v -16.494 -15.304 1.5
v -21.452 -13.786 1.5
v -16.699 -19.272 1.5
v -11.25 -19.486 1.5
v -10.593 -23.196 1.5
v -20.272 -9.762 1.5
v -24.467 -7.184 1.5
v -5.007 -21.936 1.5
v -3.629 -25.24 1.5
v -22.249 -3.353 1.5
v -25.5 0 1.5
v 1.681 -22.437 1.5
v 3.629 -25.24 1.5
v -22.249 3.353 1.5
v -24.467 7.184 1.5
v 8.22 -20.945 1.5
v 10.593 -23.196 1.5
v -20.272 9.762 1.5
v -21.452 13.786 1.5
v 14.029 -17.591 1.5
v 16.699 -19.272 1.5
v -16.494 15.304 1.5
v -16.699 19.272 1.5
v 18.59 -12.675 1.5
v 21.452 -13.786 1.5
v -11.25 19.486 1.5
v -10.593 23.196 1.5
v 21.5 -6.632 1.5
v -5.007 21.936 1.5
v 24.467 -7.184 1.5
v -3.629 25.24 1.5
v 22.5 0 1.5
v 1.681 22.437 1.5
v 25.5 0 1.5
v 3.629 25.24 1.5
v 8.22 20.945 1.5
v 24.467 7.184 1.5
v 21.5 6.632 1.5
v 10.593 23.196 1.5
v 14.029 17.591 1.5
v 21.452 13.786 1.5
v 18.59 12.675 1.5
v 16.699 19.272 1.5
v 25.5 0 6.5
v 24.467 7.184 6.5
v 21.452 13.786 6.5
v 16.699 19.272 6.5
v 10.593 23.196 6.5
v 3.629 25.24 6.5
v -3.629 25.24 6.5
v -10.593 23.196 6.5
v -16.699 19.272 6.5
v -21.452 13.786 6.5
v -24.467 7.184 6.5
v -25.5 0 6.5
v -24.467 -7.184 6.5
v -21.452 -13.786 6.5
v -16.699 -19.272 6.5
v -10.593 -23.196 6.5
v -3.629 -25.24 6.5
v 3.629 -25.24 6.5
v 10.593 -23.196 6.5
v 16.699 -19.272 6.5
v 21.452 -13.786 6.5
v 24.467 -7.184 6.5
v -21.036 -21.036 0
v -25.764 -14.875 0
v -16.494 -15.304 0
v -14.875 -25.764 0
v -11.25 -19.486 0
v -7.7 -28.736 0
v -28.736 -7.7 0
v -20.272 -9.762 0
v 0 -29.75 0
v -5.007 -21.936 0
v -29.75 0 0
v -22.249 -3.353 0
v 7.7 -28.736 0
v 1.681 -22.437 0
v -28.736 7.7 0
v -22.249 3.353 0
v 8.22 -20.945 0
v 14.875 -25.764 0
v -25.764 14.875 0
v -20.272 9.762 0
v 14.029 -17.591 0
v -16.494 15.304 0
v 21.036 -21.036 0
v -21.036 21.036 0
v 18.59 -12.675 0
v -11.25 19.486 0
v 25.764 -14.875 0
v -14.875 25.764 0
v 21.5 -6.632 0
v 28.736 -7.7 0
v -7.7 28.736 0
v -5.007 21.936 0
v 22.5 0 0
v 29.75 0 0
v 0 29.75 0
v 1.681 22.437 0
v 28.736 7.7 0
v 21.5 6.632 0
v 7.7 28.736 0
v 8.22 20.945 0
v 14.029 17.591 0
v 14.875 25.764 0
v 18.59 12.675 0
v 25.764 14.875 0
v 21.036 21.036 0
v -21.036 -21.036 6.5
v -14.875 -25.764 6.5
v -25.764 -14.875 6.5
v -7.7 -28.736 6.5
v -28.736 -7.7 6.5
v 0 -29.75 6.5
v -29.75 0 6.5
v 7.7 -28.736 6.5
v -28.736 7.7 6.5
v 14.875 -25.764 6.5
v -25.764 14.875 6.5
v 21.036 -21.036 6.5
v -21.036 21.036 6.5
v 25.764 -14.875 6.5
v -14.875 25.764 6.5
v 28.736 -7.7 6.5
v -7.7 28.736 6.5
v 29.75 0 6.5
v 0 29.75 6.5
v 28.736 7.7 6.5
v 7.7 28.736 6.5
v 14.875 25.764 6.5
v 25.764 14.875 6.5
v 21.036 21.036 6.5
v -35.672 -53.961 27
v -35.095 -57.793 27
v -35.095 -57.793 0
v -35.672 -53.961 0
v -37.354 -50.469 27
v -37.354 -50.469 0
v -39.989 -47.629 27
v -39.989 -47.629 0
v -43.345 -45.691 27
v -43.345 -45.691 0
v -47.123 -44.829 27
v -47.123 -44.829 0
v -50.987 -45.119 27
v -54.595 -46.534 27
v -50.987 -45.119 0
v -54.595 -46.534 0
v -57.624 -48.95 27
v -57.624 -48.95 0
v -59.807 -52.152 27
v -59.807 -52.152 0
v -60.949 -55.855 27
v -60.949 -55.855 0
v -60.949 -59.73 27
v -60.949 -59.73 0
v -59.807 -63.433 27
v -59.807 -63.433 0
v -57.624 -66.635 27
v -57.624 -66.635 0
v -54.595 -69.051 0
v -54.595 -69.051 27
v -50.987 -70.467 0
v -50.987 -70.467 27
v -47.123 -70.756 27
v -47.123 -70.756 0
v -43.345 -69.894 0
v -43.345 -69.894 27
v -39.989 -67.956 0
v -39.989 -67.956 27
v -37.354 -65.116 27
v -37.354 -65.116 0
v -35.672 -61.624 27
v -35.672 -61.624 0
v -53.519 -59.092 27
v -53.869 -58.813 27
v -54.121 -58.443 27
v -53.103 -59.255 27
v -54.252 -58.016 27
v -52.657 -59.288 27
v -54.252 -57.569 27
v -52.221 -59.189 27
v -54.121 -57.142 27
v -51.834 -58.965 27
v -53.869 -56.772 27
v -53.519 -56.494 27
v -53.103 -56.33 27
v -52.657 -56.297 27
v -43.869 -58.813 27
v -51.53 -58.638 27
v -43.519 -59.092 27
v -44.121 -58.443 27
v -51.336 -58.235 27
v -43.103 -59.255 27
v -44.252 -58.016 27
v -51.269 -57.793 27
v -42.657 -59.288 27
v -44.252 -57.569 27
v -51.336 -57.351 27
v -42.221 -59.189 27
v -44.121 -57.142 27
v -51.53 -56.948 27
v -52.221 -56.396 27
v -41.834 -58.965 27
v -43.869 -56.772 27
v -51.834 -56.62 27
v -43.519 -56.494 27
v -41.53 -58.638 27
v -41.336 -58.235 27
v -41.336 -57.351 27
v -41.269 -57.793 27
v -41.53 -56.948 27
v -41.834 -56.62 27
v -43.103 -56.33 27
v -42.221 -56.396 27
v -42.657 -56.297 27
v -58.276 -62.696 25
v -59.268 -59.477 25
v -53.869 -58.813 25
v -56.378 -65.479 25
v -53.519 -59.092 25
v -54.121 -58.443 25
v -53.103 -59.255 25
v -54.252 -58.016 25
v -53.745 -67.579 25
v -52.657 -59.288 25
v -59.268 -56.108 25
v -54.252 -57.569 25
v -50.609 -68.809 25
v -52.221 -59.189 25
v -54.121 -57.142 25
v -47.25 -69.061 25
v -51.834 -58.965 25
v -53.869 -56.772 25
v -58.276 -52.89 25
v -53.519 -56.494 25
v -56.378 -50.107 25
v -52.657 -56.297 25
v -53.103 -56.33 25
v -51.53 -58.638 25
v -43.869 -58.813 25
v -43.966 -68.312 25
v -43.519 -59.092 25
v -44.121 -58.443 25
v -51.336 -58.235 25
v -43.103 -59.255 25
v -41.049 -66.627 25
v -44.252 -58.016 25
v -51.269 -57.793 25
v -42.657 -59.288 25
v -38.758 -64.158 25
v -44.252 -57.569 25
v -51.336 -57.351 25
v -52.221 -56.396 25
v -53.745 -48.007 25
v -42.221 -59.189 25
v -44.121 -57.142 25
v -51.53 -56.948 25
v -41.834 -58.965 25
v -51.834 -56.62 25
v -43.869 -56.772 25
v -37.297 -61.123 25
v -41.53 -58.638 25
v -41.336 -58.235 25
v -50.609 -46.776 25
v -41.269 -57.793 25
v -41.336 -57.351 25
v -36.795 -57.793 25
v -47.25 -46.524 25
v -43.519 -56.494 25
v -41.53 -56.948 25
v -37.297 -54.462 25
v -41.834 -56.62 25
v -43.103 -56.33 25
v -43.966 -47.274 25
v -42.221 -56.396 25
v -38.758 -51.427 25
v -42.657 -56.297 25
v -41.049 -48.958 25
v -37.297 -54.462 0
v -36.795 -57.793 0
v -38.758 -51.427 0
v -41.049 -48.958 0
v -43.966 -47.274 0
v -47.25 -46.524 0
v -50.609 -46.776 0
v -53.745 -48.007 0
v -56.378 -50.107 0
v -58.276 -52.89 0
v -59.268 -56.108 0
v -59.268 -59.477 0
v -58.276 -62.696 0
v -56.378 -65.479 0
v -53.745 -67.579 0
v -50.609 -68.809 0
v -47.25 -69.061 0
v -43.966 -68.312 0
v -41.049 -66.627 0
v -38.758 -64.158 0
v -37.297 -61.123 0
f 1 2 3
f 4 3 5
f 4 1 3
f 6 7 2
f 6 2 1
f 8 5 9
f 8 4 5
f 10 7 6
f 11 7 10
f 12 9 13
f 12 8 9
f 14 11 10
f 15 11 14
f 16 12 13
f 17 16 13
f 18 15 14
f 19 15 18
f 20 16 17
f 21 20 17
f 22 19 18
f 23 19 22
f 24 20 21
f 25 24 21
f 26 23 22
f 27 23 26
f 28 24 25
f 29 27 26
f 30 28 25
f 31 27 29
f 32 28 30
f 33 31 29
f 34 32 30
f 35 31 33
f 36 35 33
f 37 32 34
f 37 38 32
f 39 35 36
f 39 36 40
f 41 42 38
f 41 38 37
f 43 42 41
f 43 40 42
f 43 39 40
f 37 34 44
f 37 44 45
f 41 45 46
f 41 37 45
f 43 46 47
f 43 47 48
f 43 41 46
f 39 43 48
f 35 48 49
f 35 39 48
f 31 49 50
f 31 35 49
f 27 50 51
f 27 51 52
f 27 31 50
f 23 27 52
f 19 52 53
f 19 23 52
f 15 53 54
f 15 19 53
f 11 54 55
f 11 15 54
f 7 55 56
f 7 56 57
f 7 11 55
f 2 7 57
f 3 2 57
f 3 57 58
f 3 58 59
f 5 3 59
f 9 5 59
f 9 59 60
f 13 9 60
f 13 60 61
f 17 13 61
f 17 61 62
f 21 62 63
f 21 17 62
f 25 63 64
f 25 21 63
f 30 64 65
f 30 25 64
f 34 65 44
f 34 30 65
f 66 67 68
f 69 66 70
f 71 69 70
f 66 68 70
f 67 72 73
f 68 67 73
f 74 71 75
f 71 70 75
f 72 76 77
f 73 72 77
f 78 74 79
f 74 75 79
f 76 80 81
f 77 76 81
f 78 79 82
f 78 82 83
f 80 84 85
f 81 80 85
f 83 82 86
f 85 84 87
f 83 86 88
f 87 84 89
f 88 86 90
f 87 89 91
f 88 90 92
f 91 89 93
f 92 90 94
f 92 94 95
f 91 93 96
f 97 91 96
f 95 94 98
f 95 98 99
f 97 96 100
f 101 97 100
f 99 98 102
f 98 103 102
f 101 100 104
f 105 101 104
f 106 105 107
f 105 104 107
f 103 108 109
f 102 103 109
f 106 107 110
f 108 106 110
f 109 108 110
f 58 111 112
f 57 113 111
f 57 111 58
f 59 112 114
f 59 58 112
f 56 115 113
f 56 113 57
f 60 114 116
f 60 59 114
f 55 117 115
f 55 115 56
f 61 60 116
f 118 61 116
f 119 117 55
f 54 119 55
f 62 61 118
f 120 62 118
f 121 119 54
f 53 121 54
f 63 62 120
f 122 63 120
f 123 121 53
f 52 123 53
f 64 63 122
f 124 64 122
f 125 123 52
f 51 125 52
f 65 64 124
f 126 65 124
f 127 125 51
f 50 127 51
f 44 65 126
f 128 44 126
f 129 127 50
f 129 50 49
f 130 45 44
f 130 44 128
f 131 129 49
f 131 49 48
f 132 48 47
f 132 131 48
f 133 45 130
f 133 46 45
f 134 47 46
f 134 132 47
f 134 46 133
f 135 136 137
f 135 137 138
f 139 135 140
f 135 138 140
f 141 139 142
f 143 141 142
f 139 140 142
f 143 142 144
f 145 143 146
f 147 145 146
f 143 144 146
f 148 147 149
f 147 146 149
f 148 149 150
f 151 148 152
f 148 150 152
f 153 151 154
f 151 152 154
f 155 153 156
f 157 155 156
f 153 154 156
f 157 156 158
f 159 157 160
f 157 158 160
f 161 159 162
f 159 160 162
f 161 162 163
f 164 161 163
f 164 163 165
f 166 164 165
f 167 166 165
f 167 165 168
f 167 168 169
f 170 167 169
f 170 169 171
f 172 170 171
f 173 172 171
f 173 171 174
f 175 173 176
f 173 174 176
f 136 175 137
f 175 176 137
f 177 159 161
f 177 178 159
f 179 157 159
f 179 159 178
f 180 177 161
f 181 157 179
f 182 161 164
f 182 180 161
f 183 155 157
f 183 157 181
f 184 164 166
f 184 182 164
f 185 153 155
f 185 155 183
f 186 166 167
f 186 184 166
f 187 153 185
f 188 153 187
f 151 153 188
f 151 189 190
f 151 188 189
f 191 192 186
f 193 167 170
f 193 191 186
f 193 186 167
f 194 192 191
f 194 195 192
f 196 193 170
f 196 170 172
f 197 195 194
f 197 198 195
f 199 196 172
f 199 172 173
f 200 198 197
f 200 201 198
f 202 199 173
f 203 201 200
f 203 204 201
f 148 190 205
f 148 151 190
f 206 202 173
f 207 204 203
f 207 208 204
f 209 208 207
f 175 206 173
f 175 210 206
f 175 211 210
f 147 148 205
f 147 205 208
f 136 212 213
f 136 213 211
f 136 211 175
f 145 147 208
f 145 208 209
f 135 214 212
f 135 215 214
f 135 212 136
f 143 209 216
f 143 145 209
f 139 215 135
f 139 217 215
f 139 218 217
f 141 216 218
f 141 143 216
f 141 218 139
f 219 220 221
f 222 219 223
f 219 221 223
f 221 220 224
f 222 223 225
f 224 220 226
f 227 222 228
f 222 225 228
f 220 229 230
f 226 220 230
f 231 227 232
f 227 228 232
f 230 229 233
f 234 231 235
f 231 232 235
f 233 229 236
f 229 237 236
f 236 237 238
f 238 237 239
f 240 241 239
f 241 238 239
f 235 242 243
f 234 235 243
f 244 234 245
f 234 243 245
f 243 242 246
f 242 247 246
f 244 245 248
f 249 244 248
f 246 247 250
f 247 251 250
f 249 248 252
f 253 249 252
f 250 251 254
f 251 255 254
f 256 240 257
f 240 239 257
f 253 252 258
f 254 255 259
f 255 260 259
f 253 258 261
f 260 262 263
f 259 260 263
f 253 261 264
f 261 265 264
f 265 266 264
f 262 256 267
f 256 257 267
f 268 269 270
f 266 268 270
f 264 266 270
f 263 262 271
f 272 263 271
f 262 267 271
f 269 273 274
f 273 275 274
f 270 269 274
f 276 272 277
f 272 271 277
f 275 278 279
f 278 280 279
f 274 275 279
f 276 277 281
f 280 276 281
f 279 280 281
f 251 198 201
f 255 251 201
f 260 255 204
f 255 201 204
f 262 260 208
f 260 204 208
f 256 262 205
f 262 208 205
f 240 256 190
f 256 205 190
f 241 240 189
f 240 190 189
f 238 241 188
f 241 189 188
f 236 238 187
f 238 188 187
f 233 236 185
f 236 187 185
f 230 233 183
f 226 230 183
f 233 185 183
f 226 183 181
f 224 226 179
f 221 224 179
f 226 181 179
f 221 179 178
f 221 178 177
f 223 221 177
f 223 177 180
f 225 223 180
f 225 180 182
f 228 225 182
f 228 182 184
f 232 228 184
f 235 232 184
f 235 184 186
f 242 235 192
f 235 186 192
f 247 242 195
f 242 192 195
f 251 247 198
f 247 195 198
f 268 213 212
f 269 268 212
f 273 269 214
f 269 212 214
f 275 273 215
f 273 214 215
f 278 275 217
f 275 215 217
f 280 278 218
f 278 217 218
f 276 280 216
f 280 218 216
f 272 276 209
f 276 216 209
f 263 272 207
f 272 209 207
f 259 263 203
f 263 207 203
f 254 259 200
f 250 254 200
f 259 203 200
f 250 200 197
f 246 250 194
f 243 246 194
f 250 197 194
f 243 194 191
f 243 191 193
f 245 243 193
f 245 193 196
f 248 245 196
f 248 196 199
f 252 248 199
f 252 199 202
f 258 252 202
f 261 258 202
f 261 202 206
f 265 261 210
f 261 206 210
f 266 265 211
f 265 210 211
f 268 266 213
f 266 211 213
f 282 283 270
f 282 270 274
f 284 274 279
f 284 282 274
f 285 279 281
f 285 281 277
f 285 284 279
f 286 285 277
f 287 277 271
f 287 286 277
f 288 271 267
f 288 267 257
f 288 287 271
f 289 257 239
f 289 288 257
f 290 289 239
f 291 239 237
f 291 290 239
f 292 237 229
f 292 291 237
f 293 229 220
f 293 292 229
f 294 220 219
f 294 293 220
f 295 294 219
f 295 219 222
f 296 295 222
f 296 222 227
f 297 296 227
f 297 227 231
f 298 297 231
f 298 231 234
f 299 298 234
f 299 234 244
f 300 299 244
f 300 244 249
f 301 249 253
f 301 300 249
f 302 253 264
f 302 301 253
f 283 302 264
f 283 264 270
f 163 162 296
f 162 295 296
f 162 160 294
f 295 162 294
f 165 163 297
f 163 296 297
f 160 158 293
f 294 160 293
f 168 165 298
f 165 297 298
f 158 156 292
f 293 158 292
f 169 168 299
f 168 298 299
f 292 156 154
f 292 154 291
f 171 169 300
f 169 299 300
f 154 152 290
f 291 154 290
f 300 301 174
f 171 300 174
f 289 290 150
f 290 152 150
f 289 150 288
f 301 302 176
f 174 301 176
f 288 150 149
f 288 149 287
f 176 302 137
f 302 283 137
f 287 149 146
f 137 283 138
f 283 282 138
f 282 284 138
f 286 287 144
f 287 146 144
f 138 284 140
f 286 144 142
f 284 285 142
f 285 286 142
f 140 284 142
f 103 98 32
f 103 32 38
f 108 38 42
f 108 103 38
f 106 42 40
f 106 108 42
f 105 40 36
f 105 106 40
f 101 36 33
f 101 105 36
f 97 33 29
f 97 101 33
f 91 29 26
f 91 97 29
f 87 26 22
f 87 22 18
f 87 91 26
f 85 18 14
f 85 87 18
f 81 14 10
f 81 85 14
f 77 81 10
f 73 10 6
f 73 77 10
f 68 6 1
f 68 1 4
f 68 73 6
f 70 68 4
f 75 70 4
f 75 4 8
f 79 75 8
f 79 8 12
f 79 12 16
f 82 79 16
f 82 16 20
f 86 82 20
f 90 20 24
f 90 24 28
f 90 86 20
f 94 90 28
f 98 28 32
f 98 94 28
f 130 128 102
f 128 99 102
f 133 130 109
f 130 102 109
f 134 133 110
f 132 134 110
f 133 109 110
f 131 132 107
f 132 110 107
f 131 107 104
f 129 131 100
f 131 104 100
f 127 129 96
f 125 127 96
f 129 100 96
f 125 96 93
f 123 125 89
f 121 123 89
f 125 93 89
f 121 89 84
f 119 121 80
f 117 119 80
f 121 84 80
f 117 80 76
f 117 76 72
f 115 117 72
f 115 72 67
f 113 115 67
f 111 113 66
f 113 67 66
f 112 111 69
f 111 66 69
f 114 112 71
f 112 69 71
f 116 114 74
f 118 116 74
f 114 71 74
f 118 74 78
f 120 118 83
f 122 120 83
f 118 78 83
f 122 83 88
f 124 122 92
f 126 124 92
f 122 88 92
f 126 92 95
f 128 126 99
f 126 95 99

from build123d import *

# Parameters (mm, degrees)
F0_R     = 29.75
F0_R_2   = 22.5
F1_DEPTH = 1.5
F2_R     = 29.75
F2_R_2   = 25.5
F3_DEPTH = 5
F4_R     = 13
F4_R_2   = 11.3
F5_DEPTH = 25
F6_R     = 13
F7_DEPTH = 2
F8_R     = 1.5
F9_DEPTH = 2


with BuildPart() as f1:
    # F0 (on Top) → F1 (new body)
    with BuildSketch(Plane.XY):
        Circle(F0_R)
        Circle(F0_R_2, mode=Mode.SUBTRACT)
    extrude(amount=F1_DEPTH)

    # F2 (on face) → F3 (join)
    with BuildSketch(Plane.XY.offset(1.5)):
        Circle(F2_R)
        Circle(F2_R_2, mode=Mode.SUBTRACT)
    extrude(amount=F3_DEPTH)


with BuildPart() as f5:
    # F4 (on Top) → F5 (new body)
    with BuildSketch(Plane.XY):
        with Locations((-48.094667, -57.792641)):
            Circle(F4_R)
        with Locations((-48.094667, -57.792641)):
            Circle(F4_R_2, mode=Mode.SUBTRACT)
    extrude(amount=F5_DEPTH)

    # F6 (on face) → F7 (join)
    with BuildSketch(Plane.XY.offset(25)):
        with Locations((-48.094667, -57.792641)):
            Circle(F6_R)
    extrude(amount=F7_DEPTH)

    # F8 (on face) → F9 (cut, through all)
    with BuildSketch(Plane.XY.offset(27)):
        with Locations((-42.769095, -57.792641)):
            Circle(F8_R)
        with Locations((-52.769095, -57.792641)):
            Circle(F8_R)
    extrude(amount=-F9_DEPTH, mode=Mode.SUBTRACT)


solid = Compound([f1.part, f5.part])
